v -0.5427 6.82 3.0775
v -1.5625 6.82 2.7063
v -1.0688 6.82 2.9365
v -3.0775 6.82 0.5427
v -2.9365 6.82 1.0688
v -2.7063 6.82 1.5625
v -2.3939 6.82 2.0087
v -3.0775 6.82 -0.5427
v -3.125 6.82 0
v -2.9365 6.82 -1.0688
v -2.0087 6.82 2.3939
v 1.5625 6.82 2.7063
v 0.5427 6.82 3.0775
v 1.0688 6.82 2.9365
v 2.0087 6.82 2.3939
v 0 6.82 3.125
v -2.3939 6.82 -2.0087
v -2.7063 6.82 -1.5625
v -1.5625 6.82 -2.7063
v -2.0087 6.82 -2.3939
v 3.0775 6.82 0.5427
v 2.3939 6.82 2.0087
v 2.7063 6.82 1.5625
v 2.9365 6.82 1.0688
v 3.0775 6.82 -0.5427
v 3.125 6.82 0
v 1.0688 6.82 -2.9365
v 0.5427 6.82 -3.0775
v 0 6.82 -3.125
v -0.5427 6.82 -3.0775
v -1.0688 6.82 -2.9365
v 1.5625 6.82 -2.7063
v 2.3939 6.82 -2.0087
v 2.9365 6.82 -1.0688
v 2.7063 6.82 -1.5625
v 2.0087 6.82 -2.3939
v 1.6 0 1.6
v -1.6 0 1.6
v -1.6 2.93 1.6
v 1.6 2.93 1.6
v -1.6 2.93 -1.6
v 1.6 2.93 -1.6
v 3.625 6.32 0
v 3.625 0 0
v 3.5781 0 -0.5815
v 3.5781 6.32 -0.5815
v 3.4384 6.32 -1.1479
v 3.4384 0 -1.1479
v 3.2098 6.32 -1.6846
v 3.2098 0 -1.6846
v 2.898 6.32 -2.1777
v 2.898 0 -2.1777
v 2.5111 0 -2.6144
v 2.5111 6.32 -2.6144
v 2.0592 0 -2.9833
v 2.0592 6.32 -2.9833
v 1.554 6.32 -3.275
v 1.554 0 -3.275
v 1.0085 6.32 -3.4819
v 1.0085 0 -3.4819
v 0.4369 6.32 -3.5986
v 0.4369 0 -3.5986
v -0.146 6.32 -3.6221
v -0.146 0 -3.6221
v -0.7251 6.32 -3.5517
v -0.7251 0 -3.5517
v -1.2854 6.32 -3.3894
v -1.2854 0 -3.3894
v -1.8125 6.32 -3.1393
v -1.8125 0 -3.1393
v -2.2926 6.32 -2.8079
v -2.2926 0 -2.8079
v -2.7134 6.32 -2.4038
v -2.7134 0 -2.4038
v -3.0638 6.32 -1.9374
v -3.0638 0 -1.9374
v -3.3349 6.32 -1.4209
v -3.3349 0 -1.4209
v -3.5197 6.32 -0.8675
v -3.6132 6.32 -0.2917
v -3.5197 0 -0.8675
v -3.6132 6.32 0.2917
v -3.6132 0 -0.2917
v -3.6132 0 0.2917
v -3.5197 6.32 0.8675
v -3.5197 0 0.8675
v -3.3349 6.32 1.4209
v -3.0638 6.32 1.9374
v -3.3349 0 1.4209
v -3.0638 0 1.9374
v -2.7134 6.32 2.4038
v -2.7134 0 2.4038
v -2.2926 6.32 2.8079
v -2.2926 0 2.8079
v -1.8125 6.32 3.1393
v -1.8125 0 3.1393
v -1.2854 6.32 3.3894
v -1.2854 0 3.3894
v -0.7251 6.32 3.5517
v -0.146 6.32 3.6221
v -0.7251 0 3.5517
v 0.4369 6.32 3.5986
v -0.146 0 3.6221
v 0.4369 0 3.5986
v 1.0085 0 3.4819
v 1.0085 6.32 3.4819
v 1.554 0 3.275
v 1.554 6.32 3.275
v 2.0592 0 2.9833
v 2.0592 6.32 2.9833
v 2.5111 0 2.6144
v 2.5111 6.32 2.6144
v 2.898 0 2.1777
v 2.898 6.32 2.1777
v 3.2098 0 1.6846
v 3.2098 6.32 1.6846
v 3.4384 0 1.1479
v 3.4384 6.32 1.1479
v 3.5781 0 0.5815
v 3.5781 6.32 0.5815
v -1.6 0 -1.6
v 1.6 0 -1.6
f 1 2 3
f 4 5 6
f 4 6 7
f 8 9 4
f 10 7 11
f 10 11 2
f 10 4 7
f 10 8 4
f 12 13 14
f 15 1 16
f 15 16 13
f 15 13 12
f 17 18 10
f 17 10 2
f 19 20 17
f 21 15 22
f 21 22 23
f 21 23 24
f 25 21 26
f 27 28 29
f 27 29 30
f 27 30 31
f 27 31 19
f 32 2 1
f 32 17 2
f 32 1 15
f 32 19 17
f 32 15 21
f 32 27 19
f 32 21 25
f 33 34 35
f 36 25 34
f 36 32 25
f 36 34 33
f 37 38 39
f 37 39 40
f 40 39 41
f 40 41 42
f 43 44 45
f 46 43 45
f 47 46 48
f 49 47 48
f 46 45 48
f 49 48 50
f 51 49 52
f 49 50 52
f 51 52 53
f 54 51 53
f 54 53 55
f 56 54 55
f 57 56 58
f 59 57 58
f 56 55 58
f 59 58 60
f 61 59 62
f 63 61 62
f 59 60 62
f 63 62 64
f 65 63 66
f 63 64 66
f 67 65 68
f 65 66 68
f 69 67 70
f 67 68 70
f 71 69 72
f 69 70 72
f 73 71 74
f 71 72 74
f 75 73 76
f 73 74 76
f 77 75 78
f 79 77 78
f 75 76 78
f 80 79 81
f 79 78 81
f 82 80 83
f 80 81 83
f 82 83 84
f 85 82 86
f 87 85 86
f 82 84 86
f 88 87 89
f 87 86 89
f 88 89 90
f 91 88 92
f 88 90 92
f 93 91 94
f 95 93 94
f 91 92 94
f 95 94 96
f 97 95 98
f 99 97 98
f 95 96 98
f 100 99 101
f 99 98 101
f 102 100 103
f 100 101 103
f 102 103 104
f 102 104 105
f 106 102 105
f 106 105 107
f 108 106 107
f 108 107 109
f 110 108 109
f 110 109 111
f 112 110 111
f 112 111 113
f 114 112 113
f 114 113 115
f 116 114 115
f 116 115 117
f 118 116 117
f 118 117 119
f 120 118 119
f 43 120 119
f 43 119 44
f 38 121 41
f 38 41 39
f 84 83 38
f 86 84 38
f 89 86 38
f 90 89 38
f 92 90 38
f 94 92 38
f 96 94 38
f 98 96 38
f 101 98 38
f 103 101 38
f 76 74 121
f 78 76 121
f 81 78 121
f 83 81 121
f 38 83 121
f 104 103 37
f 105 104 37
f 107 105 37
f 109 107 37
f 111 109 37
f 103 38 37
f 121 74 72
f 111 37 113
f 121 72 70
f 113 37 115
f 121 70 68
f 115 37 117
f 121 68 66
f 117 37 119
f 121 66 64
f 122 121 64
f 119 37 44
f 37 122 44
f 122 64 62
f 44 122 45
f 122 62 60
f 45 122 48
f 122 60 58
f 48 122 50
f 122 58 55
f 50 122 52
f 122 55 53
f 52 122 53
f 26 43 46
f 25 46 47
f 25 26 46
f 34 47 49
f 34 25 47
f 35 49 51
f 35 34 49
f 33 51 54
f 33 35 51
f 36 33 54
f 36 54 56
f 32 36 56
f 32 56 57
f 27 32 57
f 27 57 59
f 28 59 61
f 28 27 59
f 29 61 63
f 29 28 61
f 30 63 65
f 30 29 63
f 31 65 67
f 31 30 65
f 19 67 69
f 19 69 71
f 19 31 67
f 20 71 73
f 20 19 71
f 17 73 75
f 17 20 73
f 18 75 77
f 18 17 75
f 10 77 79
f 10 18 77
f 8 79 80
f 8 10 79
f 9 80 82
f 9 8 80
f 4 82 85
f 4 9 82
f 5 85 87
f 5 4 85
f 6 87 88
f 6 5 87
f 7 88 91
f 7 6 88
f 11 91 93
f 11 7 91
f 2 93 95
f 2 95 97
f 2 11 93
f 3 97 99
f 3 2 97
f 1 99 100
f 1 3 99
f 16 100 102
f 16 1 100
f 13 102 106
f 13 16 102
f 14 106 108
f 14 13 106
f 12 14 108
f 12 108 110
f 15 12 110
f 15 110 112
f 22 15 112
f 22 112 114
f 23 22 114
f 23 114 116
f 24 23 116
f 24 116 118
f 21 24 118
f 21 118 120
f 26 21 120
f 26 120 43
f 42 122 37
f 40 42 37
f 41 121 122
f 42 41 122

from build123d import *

# Parameters (mm, degrees)
SKETCH1_R           = 3.625
BOSS_EXTRUDE1_DEPTH = 6.82
CHAMFER1_SIZE       = 0.5
SKETCH2_W           = 3.2
SKETCH2_H           = 3.2
CUT_EXTRUDE1_DEPTH  = 2.93


with BuildPart() as part:
    # Sketch1 → Boss-Extrude1 (new body)
    with BuildSketch(Plane(origin=(0, 0, 0), x_dir=(1, 0, 0), z_dir=(0, 1, 0))):
        Circle(SKETCH1_R)
    extrude(amount=BOSS_EXTRUDE1_DEPTH)

    # Chamfer1
    chamfer1_edges = [part.edges().sort_by_distance(p)[0] for p in [
        (-3.625, 6.82, 0),
    ]]
    chamfer(chamfer1_edges, length=CHAMFER1_SIZE)

    # Sketch2 → Cut-Extrude1 (cut)
    with BuildSketch(Plane.XZ):
        Rectangle(SKETCH2_W, SKETCH2_H)
    extrude(amount=-CUT_EXTRUDE1_DEPTH, mode=Mode.SUBTRACT)


solid = part.part
